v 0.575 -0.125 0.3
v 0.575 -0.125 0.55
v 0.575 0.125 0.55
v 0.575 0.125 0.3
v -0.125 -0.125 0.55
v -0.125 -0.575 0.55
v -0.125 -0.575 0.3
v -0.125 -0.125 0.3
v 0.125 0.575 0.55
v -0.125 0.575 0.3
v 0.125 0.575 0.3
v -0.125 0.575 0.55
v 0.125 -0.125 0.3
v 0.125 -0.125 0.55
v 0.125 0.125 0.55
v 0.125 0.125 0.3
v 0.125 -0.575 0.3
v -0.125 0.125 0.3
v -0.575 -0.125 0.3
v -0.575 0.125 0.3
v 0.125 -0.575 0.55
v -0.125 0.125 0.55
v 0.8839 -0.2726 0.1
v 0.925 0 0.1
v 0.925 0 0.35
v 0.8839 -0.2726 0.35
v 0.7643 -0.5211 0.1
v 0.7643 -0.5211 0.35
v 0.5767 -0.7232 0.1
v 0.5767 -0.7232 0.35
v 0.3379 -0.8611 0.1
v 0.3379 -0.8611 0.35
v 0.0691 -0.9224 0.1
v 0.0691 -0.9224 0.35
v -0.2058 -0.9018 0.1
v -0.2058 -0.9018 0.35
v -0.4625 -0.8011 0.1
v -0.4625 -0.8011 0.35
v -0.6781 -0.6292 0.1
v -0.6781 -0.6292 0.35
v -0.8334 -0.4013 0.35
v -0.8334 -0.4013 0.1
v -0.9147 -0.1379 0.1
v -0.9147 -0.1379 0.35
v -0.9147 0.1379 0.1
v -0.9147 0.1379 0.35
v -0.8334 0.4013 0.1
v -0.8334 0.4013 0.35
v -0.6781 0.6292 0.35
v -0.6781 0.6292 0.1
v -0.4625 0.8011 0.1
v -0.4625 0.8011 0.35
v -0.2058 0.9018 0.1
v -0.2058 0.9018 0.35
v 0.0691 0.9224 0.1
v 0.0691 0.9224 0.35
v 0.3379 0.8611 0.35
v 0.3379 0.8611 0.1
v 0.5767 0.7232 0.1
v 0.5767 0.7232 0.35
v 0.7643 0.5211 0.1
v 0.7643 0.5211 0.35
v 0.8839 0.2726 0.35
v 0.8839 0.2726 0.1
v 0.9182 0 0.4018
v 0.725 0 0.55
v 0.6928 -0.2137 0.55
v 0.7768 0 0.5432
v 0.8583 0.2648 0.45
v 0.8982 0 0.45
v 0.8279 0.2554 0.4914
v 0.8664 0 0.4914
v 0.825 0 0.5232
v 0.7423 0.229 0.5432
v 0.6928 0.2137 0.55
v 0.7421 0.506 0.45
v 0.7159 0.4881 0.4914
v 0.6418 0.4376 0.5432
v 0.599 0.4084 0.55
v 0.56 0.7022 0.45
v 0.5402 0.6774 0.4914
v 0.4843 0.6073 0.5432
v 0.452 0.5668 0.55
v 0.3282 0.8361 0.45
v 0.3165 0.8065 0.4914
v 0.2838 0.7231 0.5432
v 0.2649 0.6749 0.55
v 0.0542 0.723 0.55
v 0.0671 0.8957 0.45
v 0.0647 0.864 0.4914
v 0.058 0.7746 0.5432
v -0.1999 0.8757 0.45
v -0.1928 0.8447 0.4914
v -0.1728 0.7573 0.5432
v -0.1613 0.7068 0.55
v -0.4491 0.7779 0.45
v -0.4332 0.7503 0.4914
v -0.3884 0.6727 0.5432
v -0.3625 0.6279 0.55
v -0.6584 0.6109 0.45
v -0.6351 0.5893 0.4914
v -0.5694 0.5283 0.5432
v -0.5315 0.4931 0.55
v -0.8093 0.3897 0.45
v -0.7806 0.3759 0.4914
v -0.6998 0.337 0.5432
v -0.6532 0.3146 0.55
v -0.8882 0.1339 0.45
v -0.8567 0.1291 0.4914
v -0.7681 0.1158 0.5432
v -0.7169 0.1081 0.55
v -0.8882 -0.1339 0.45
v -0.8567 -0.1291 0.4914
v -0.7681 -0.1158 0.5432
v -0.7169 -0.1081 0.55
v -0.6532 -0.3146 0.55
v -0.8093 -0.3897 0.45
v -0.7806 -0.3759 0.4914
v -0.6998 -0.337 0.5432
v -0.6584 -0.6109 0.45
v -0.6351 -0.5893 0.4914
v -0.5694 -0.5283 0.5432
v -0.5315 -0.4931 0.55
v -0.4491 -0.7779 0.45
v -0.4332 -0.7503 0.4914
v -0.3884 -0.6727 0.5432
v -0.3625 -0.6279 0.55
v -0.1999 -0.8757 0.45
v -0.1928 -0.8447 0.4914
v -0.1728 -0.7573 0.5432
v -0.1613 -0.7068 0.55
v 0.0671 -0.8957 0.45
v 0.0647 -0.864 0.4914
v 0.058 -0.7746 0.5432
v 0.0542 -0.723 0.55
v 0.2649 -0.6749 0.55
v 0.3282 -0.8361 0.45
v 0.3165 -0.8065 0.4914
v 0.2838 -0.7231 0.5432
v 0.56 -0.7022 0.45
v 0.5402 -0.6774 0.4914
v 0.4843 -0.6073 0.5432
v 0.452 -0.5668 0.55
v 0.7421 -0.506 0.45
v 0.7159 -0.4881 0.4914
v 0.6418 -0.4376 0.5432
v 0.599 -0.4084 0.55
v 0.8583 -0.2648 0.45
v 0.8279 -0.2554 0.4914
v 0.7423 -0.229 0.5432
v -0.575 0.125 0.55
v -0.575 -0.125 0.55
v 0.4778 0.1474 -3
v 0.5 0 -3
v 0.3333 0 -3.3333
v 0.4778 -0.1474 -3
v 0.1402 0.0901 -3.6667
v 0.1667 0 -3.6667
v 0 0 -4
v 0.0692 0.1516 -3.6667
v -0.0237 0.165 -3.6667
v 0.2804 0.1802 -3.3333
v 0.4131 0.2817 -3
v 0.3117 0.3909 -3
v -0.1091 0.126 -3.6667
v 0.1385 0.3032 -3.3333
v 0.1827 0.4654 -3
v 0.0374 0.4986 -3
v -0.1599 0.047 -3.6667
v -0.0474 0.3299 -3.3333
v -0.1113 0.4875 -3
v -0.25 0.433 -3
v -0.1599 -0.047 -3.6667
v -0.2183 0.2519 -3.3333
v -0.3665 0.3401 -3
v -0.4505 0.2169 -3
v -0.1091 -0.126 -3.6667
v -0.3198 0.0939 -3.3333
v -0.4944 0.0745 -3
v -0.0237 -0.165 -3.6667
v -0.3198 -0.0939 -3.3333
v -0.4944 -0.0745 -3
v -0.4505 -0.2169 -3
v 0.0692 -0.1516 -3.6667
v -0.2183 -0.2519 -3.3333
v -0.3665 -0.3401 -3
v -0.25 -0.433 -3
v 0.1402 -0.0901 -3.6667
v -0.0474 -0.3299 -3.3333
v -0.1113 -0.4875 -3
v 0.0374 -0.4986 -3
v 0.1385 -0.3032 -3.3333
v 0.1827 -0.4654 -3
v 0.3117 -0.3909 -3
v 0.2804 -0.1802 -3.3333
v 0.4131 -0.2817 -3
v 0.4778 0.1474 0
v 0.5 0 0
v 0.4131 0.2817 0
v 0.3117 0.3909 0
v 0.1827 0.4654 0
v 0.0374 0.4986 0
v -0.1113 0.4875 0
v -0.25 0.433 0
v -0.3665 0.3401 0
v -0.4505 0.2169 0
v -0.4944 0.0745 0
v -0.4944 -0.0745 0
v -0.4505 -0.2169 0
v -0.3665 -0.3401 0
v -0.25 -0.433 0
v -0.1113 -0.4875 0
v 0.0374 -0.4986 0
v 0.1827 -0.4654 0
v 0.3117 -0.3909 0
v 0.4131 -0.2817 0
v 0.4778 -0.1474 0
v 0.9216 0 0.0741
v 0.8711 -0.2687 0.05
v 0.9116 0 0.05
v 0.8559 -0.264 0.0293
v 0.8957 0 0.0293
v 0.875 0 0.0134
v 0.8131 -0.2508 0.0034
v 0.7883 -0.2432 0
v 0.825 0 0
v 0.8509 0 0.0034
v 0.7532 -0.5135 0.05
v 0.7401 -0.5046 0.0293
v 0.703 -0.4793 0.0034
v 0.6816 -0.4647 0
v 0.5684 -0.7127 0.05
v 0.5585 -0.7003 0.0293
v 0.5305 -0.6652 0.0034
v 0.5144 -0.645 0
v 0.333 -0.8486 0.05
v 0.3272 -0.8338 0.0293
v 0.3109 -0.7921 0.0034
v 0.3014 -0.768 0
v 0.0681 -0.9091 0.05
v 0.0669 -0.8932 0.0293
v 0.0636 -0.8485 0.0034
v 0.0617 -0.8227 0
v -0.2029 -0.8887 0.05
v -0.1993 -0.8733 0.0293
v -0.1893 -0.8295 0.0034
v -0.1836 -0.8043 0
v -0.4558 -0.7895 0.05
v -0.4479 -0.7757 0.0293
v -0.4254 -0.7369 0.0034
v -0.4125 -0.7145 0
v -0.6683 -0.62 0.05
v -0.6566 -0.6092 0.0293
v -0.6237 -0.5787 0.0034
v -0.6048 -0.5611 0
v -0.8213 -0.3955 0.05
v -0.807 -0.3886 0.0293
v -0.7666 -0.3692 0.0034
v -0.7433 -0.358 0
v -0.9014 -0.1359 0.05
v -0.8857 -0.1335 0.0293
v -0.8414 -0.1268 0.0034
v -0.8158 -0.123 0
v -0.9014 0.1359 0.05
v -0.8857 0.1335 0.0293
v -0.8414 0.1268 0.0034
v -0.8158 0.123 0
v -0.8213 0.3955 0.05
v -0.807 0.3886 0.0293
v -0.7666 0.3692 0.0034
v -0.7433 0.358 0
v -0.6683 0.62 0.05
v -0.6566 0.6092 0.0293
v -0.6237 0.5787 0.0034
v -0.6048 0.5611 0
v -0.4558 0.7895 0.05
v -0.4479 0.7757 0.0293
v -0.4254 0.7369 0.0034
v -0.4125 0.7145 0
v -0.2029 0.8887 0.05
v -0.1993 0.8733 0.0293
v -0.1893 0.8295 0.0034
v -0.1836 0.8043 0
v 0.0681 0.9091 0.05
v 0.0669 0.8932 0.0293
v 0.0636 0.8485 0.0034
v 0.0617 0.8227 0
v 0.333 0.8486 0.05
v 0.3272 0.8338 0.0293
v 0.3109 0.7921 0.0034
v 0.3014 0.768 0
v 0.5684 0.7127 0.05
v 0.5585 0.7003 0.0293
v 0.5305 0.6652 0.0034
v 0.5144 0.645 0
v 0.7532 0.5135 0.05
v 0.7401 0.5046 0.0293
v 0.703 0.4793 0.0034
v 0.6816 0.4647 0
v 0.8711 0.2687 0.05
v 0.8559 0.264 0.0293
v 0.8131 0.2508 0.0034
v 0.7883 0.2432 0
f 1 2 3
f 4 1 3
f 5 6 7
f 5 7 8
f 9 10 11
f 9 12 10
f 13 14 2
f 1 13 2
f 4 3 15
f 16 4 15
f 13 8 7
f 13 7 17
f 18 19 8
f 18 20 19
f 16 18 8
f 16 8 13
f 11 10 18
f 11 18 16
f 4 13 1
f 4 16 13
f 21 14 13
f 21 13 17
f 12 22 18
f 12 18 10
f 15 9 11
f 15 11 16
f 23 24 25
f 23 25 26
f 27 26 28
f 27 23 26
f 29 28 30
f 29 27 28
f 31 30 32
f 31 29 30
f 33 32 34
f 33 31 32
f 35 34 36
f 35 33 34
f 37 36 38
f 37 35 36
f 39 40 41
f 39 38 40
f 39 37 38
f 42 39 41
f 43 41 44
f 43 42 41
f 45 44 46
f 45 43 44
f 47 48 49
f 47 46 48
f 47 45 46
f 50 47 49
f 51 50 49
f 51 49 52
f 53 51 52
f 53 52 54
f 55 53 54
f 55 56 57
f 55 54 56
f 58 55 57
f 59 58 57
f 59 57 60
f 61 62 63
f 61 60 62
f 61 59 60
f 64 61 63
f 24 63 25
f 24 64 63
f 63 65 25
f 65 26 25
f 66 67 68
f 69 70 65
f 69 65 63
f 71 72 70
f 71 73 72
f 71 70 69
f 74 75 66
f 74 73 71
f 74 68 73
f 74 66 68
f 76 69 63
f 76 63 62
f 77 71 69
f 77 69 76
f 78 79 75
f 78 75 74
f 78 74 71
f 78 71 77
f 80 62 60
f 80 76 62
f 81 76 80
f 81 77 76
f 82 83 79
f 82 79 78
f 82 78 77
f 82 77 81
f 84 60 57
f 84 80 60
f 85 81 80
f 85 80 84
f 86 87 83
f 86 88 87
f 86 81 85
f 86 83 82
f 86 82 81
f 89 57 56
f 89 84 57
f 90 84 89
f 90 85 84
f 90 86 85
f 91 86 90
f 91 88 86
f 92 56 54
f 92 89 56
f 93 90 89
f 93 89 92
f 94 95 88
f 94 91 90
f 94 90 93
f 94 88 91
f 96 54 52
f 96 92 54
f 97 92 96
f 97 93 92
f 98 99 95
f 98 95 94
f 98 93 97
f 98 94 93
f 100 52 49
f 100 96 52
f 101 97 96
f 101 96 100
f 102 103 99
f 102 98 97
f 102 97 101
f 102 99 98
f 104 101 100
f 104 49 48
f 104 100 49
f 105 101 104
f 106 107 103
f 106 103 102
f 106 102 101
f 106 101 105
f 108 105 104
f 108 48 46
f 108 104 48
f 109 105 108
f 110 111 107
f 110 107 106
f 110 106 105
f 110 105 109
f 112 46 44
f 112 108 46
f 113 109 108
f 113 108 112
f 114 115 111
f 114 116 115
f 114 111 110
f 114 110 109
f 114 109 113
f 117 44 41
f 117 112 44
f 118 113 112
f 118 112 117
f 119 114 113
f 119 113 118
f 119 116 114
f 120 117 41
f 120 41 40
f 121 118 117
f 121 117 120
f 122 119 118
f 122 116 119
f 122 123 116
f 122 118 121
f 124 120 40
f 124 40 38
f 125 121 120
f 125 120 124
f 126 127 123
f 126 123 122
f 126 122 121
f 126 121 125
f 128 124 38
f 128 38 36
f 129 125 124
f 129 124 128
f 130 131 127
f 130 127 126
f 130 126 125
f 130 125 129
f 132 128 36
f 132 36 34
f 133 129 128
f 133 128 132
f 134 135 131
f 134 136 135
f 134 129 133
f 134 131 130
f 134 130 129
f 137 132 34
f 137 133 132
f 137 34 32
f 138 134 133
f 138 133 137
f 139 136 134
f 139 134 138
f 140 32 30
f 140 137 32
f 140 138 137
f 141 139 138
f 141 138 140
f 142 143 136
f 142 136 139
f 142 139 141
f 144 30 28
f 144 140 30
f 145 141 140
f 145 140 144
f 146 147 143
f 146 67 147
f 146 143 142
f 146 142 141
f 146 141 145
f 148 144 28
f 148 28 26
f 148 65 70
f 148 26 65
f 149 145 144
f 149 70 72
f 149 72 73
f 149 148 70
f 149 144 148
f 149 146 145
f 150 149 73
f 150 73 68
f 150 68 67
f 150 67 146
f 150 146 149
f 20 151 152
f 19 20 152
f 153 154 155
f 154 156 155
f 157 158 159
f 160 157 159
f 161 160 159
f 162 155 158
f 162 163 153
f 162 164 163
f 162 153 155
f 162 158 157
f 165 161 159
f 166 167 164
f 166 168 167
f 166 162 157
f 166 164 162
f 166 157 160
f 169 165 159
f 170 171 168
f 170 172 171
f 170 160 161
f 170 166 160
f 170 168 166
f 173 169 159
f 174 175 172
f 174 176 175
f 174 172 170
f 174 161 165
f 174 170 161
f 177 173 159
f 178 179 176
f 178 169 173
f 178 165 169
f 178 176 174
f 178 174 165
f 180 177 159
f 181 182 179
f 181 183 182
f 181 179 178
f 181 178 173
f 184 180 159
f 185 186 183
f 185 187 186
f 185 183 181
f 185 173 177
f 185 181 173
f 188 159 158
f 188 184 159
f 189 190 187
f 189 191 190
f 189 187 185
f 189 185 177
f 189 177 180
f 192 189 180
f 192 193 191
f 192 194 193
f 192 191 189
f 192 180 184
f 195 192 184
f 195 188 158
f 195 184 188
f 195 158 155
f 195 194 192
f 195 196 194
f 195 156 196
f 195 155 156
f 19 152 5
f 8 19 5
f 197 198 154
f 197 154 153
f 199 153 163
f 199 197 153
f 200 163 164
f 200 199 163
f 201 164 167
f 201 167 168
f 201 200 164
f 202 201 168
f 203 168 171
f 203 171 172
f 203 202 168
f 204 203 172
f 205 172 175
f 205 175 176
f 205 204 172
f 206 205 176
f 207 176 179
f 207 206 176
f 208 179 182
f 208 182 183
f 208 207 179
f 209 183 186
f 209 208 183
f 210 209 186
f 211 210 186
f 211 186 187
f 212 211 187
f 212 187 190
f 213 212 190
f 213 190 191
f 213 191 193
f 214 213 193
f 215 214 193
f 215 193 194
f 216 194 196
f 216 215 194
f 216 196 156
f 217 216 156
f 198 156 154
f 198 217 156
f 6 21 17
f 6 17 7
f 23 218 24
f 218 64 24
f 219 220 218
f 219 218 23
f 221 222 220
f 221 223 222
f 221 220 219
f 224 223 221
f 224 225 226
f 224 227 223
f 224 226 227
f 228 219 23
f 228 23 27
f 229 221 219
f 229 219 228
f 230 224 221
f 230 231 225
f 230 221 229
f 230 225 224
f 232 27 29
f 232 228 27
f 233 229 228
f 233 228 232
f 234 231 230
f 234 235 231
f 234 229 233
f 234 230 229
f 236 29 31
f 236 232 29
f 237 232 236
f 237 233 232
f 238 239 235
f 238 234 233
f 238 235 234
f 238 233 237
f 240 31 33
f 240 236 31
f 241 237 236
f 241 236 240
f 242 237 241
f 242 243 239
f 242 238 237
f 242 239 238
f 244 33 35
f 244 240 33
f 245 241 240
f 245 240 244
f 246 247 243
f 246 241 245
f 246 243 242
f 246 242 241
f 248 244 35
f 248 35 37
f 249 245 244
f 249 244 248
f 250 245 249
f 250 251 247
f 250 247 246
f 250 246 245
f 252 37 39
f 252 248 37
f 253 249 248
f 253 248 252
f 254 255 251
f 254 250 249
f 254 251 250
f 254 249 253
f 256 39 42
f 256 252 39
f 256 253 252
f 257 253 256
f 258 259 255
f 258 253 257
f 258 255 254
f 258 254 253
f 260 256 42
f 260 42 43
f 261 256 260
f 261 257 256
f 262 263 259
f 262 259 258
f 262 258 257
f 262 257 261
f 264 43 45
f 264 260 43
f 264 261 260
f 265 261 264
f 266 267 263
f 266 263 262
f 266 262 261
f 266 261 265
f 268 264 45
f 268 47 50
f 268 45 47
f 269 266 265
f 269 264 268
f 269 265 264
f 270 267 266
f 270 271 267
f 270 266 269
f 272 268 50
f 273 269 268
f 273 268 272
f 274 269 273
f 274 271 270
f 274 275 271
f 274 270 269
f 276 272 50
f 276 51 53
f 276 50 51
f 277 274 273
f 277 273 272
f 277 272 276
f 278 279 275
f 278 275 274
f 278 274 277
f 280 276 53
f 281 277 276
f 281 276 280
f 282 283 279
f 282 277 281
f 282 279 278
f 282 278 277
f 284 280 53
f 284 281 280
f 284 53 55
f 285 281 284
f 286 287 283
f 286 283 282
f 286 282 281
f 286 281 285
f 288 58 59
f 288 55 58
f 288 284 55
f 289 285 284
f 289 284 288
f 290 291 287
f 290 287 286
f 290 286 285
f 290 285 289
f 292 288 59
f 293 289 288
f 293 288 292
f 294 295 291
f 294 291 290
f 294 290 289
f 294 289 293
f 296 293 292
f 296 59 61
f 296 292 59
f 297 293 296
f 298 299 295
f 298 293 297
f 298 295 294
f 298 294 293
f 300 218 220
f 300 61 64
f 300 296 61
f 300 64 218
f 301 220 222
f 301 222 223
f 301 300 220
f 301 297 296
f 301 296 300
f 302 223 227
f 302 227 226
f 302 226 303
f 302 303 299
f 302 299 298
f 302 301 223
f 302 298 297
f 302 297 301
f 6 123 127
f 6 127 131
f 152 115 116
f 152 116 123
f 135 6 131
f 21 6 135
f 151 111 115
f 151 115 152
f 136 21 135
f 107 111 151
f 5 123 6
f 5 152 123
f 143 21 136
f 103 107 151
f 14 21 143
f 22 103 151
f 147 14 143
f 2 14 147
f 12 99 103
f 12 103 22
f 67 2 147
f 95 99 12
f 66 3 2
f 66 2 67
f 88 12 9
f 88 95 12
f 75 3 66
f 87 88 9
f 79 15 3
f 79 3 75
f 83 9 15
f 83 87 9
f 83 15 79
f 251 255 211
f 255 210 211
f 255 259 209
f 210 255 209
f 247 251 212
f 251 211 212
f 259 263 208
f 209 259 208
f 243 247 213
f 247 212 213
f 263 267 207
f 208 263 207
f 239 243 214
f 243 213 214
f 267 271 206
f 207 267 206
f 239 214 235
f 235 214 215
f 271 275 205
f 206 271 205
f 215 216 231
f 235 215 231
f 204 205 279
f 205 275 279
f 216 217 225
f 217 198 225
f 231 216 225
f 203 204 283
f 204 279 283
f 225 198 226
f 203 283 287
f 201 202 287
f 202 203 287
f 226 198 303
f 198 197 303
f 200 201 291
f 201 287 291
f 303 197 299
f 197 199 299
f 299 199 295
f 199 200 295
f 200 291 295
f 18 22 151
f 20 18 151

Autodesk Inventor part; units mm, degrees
ref_plane "YZ Plane" through (0, 0, 0) normal (1, 0, 0) x (0, 1, 0)
ref_plane "XZ Plane" through (0, 0, 0) normal (0, 1, 0) x (-1, 0, 0)
ref_plane "XY Plane" through (0, 0, 0) normal (0, 0, 1) x (1, 0, 0)
sketch "Sketch1" plane through (0, 0, 0) normal (0, 0, 1) x (1, 0, 0)
  circle A0 centre (0, 0) radius 0.5
  dimension "d0" = 1
extrude "Extrusion1" add sketch "Sketch1" against normal blind 4
sketch "Sketch2" plane through (0, 0, 0) normal (0, 0, 1) x (1, 0, 0)
  circle A0 centre (0, 0) radius 0.925
  dimension "d3" = 1.85
extrude "Extrusion2" add sketch "Sketch2" along normal blind 0.55
chamfer "Chamfer1" distance 0.5 distance2 1 1 edges at (-0.5, 0, -4) measured on face at (0.3086, -0.1558, -4)
fillet "Fillet1" radius 0.2 1 edges at (-0.925, 0, 0.55)
fillet "Fillet2" radius 0.1 1 edges at (-0.925, 0, 0)
sketch "Sketch3" plane through (0, 0, 0.55) normal (0, 0, 1) x (1, 0, 0)
  line L0 (0.575, 0.125) -> (-0.575, 0.125)
  line L1 (-0.575, 0.125) -> (-0.575, -0.125)
  line L2 (-0.575, -0.125) -> (0.575, -0.125)
  line L3 (0.575, -0.125) -> (0.575, 0.125)
  line L4 (0.575, 0.125) -> (-0.575, -0.125) construction
  line L5 (-0.575, 0.125) -> (0.575, -0.125) construction
  line L6 (0.125, -0.575) -> (-0.125, -0.575)
  line L7 (-0.125, -0.575) -> (-0.125, 0.575)
  line L8 (-0.125, 0.575) -> (0.125, 0.575)
  line L9 (0.125, 0.575) -> (0.125, -0.575)
  line L10 (0.125, -0.575) -> (-0.125, 0.575) construction
  line L11 (-0.125, -0.575) -> (0.125, 0.575) construction
  point P0 (0, 0)
  point P1 (0, 0)
  dimension "d11" = 1.15
  dimension "d12" = 0.25
  dimension "d13" = 0.25
  dimension "d14" = 1.15
extrude "Extrusion3" cut sketch "Sketch3" against normal blind 0.25
thread "Thread1" size "M1x0.25" class "6g" standard "ANSI Metric M Profile" full length
properties part number "M1_4mm self-tapping screw"
